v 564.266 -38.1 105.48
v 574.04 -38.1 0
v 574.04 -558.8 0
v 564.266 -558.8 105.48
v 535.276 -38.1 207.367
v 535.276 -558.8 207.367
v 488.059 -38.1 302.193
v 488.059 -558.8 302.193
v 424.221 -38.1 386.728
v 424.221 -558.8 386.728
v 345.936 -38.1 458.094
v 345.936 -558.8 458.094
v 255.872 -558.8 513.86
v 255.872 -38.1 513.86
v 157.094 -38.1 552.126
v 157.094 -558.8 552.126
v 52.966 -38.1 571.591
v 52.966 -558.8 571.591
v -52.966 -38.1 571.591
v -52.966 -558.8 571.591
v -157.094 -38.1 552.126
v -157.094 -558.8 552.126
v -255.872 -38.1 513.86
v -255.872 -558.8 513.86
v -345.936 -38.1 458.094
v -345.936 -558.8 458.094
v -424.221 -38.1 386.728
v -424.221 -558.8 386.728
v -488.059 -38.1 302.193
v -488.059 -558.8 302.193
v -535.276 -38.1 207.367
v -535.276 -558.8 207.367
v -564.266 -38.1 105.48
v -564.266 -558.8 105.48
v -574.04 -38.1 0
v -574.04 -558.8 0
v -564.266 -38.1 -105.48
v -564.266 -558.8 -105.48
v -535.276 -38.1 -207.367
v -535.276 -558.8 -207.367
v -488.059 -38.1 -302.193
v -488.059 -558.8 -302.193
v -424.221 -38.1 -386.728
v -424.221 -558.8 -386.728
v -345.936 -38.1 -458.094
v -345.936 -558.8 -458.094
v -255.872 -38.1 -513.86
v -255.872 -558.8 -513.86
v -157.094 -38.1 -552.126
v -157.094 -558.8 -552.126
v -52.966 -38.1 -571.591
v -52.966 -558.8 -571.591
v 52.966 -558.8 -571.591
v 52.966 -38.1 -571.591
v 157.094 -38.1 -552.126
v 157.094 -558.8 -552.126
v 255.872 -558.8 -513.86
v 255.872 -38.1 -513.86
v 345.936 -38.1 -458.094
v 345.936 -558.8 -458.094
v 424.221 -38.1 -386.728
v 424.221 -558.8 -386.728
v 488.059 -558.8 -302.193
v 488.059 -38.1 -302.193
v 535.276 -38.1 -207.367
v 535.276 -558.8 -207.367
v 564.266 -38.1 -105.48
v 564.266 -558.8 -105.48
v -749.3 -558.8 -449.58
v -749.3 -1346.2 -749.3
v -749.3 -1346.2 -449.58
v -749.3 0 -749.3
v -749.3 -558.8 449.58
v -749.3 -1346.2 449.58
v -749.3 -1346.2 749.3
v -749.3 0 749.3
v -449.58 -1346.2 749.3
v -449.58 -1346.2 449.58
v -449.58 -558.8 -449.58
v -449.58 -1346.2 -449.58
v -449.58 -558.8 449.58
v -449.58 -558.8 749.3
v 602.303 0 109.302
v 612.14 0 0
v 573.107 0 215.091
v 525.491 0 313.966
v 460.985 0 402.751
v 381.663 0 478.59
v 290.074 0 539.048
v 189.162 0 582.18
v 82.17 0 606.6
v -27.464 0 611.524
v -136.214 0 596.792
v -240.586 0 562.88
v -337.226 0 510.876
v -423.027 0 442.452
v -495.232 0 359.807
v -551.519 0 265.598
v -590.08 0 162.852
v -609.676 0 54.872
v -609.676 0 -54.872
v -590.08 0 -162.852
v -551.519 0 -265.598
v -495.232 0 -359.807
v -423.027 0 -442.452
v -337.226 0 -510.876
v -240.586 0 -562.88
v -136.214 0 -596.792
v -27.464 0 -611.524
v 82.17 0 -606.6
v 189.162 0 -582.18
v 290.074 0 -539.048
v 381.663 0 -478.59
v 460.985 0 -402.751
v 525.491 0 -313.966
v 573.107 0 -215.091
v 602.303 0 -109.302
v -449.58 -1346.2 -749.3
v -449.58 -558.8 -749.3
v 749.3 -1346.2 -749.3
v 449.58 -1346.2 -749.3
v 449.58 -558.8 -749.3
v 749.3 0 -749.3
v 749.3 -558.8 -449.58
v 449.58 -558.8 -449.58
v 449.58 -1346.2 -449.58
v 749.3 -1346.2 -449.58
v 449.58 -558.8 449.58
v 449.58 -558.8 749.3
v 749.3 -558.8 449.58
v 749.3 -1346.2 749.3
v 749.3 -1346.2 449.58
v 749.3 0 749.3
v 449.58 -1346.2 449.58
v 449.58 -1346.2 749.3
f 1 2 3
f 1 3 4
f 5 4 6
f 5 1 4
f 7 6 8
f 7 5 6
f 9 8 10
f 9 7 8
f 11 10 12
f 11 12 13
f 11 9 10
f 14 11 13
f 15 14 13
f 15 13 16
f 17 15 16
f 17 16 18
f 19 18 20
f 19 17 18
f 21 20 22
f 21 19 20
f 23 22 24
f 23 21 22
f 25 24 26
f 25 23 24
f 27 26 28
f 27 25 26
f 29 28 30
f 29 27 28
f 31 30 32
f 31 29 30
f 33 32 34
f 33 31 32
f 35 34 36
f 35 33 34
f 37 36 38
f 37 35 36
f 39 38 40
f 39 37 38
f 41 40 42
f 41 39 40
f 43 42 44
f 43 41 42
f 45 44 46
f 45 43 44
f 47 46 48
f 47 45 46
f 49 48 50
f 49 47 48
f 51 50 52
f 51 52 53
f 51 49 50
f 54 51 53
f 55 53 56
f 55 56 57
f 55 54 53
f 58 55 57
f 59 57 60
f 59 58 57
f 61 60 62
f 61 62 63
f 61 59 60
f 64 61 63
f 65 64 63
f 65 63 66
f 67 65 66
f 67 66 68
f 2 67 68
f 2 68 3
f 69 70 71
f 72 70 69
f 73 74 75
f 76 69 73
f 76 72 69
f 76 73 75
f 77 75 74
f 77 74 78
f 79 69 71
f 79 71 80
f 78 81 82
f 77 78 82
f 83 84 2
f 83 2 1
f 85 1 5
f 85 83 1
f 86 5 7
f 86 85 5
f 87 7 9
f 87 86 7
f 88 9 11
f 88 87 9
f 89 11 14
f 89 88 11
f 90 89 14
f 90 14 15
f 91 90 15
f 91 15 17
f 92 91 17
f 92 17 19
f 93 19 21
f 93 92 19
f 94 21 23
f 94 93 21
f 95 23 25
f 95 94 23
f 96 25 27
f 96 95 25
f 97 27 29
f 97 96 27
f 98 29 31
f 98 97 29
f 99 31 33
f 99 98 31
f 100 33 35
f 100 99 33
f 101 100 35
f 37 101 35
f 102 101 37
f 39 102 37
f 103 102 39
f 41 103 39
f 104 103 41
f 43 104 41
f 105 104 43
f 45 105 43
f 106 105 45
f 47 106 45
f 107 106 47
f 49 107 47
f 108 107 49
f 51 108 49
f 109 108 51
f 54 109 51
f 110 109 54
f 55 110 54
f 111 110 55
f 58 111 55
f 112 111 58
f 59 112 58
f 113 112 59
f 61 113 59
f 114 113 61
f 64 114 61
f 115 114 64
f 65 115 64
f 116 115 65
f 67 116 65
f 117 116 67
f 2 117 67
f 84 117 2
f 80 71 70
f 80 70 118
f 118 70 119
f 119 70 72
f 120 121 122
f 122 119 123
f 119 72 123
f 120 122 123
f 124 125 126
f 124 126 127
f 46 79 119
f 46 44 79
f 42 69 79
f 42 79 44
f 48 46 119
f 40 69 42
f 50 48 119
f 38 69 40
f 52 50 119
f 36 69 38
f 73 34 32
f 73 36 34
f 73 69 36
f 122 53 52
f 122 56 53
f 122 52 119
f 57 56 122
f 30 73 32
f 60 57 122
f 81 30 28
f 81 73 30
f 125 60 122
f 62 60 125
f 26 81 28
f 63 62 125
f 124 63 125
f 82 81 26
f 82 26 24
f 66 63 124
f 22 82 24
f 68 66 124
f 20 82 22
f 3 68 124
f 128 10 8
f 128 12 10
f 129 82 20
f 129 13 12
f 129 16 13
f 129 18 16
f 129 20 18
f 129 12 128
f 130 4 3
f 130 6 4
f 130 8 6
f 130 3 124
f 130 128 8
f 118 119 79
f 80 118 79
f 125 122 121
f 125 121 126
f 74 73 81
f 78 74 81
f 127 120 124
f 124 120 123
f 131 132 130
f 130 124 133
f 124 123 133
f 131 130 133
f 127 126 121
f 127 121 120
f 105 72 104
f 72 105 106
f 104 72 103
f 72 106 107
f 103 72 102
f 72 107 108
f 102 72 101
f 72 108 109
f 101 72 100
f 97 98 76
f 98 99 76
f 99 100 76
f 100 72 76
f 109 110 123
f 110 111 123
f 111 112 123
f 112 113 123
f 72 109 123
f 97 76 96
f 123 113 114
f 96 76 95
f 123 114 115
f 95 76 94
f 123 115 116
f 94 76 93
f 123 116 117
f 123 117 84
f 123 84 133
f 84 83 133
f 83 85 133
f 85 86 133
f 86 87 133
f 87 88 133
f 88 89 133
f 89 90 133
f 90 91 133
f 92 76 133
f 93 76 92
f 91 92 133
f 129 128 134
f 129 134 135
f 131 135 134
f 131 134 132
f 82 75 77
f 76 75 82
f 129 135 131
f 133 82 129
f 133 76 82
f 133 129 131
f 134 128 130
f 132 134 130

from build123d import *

# Parameters (mm, degrees)
F0_W     = 1498.6
F0_H     = 1498.6
F0_R     = 574.04
F1_DEPTH = 558.8
F2_W     = 299.72
F2_H     = 299.72
F3_DEPTH = 787.4
F4_SIZE  = 38.1


with BuildPart() as f1:
    # F0 (on Front) → F1 (new body)
    with BuildSketch(Plane.XZ):
        Rectangle(F0_W, F0_H)
        Circle(F0_R, mode=Mode.SUBTRACT)
    extrude(amount=F1_DEPTH)

    # F2 (on face) → F3 (join)
    with BuildSketch(Plane.XZ.offset(558.8)):
        with Locations((-599.44, 599.44)):
            Rectangle(F2_W, F2_H)
        with Locations((-599.44, -599.44)):
            Rectangle(F2_W, F2_H)
        with Locations((599.44, -599.44)):
            Rectangle(F2_W, F2_H)
        with Locations((599.44, 599.44)):
            Rectangle(F2_W, F2_H)
    extrude(amount=F3_DEPTH)

    # F4
    f4_edges = [f1.edges().sort_by_distance(p)[0] for p in [
        (-574.04, 0, 0),
    ]]
    chamfer(f4_edges, length=F4_SIZE)


solid = f1.part
